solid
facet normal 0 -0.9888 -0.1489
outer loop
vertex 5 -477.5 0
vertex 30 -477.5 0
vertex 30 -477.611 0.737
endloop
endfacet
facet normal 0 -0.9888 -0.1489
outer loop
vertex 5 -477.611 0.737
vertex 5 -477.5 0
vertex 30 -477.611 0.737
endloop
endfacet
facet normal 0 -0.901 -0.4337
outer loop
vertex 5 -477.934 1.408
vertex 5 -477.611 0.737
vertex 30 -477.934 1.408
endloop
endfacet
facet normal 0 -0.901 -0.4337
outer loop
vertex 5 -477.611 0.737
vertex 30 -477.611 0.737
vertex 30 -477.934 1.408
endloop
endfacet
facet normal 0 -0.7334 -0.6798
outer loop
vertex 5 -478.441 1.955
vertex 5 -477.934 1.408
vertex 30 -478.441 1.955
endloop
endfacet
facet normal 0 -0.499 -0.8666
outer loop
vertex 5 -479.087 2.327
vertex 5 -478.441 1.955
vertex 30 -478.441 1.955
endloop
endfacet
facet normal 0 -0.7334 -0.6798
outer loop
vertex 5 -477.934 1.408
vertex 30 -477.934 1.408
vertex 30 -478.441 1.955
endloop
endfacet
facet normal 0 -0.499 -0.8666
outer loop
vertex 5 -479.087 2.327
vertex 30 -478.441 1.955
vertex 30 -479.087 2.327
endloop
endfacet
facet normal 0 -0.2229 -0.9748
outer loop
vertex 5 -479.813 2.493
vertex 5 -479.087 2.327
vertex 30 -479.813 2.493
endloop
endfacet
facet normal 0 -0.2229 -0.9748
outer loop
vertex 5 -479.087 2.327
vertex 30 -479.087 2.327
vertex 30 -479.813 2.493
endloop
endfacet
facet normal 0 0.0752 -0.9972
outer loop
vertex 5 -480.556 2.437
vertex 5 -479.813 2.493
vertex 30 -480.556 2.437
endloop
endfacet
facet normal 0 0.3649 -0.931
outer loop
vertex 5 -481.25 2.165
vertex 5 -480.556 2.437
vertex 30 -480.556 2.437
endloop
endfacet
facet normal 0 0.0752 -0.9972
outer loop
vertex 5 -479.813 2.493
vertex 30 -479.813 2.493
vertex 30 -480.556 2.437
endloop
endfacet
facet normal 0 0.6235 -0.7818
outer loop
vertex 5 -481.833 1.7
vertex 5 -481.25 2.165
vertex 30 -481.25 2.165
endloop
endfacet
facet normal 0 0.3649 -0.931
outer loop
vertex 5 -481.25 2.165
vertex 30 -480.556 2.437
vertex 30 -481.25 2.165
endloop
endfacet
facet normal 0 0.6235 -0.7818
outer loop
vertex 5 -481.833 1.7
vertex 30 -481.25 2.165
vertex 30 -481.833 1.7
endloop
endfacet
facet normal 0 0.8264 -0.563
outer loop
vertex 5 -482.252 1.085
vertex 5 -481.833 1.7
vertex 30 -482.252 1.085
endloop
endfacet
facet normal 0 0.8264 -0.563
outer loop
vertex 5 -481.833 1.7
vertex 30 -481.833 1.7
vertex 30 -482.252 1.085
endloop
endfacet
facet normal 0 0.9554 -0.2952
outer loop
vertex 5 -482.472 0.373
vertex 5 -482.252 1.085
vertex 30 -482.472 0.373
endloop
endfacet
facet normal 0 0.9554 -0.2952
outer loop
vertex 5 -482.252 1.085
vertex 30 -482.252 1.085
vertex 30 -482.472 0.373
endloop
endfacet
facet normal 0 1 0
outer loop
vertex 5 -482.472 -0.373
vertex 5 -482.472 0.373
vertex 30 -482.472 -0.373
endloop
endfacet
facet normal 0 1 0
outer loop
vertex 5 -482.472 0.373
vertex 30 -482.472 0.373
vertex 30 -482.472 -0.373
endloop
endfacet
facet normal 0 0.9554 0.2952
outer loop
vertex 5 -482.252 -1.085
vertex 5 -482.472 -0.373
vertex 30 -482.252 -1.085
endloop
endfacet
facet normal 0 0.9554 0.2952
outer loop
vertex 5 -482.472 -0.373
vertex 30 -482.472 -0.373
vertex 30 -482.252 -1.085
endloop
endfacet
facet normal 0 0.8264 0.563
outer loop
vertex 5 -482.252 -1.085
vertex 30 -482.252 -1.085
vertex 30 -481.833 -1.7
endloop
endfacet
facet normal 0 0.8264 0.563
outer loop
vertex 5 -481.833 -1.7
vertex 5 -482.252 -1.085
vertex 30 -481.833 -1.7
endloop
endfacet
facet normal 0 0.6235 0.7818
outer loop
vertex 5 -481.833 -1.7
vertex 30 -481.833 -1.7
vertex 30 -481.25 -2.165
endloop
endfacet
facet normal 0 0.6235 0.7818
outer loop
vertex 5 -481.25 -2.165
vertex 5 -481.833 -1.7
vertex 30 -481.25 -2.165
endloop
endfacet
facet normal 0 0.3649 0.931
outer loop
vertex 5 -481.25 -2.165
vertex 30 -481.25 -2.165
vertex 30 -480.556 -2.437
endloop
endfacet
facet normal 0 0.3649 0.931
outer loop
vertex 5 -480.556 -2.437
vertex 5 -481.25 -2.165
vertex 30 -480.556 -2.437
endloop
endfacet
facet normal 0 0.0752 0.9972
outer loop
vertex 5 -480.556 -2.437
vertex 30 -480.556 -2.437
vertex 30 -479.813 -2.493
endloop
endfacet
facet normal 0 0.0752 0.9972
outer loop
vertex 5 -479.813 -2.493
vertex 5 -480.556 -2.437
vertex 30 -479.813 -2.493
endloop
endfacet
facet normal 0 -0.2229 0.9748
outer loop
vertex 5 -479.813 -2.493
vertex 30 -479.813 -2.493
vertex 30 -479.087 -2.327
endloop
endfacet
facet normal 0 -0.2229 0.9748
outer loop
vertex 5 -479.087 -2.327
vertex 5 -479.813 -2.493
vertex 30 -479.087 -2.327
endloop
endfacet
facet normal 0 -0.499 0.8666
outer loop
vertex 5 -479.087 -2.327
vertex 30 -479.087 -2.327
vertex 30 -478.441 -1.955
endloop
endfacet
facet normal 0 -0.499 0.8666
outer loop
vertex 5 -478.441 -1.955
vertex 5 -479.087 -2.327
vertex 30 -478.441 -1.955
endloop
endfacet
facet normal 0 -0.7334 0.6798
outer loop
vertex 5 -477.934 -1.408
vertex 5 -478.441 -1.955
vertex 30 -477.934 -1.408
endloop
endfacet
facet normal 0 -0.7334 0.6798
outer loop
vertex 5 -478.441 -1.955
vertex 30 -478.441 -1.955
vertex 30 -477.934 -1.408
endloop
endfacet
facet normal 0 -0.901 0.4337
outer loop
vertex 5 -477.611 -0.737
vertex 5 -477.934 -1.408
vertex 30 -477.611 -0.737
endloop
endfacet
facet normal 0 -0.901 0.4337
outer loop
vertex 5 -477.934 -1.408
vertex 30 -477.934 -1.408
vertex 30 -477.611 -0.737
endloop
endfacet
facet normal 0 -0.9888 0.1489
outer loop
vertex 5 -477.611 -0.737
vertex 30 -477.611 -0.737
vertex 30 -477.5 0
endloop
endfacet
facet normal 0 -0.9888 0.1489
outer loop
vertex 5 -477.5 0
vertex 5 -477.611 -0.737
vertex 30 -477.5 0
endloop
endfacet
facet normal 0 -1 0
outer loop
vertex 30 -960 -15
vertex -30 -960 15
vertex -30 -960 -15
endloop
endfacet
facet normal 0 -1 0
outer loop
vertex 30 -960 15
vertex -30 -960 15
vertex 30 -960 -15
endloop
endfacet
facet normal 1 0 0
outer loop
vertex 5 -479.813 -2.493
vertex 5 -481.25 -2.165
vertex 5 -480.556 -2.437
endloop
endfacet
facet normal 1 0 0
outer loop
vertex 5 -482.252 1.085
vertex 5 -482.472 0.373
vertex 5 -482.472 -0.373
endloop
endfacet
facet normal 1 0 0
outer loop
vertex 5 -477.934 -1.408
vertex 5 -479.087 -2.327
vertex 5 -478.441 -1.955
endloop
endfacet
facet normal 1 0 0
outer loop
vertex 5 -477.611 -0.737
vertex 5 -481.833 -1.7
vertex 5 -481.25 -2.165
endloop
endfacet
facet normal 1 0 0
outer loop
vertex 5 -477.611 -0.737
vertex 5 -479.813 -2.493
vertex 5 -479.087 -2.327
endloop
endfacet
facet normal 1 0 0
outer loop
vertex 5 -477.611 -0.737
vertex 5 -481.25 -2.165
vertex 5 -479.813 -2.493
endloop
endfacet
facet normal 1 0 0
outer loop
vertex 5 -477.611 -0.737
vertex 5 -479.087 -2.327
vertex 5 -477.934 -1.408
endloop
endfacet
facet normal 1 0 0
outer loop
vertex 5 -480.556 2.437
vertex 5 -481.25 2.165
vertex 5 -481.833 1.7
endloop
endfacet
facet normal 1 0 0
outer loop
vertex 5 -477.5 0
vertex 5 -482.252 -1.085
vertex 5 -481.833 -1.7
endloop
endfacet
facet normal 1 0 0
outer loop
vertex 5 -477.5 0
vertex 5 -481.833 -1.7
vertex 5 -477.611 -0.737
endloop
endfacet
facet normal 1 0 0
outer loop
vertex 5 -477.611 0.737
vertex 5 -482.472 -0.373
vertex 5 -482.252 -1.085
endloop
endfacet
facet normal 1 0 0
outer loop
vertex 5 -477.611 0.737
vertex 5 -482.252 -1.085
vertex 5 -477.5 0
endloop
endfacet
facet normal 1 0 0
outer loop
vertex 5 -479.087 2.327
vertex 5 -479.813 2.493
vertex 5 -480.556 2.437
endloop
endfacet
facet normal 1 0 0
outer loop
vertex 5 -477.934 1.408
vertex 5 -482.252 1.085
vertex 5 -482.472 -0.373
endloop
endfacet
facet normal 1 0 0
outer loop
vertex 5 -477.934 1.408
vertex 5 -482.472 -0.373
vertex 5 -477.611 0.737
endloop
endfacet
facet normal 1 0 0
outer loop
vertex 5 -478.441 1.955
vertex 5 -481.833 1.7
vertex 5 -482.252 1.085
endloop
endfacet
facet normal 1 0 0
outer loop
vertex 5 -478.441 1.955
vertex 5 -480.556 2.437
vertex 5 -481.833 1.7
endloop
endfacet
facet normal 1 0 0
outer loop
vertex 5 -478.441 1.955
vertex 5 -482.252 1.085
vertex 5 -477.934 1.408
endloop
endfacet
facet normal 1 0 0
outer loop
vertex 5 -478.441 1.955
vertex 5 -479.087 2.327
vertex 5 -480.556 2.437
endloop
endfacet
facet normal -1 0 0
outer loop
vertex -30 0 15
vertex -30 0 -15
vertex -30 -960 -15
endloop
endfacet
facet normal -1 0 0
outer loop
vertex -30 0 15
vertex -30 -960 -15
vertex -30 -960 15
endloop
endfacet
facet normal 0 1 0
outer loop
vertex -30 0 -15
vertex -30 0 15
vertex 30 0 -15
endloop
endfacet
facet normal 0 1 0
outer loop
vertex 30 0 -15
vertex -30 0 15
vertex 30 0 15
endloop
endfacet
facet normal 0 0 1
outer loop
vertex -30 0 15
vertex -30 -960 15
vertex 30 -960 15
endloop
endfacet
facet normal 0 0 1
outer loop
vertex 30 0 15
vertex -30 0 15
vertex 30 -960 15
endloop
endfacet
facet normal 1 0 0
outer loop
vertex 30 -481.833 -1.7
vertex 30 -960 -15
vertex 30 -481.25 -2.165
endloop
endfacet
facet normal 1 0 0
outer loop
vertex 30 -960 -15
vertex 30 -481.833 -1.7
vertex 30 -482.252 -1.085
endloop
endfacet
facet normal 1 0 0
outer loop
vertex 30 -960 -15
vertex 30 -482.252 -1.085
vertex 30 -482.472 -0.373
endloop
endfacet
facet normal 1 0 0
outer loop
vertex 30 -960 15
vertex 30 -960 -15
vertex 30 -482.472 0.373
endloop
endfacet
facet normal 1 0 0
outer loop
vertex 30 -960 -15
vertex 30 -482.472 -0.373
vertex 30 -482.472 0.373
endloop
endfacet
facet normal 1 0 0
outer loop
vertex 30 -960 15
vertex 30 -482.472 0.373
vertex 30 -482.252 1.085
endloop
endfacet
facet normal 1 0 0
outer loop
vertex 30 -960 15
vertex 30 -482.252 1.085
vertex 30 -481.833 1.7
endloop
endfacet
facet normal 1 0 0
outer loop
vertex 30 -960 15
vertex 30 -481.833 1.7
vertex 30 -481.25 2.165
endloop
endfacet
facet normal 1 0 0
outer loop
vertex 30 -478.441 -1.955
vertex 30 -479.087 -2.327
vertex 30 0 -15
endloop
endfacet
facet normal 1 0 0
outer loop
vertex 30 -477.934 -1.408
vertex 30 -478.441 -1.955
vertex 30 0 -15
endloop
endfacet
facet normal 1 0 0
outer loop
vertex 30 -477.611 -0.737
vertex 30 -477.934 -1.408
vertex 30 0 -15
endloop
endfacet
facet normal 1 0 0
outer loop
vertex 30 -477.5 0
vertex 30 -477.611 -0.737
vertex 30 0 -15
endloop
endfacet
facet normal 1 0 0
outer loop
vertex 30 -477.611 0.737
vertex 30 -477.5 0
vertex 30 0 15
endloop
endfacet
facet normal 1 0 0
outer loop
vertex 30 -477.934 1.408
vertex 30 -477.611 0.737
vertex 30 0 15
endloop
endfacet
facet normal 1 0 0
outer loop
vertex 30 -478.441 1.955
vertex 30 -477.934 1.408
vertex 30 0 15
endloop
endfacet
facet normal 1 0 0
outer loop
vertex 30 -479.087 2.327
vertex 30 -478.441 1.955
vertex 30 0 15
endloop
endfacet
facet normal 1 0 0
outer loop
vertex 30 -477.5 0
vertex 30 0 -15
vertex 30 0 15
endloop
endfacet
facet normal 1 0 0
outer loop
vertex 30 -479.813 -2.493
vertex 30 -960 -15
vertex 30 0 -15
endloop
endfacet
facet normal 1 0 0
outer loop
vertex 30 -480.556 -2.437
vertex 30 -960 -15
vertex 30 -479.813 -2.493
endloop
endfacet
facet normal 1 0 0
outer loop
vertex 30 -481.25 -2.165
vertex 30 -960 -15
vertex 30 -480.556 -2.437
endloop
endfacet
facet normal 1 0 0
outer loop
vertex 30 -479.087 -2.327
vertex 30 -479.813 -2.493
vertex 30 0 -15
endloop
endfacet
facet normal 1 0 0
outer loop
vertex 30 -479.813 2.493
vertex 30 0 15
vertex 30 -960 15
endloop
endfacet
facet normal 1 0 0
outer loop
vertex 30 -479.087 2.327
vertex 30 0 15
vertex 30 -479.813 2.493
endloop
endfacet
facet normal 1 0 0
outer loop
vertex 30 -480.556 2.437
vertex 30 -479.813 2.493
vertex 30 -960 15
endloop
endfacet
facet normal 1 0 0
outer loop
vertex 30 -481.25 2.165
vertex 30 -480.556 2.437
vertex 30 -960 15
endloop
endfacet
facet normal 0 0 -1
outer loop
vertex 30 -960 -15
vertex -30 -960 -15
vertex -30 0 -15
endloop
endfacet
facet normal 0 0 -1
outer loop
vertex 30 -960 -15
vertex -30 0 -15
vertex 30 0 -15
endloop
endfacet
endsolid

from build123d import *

# Parameters (mm, degrees)
F0_W     = 60
F0_H     = 30
F1_DEPTH = 960
F2_R     = 2.5
F3_DEPTH = 25


with BuildPart() as f1:
    # F0 (on Front) → F1 (new body)
    with BuildSketch(Plane.XZ):
        Rectangle(F0_W, F0_H)
    extrude(amount=F1_DEPTH)

    # F2 (on face) → F3 (cut)
    with BuildSketch(Plane.YZ.offset(30)):
        with Locations((-480, 0)):
            Circle(F2_R)
    extrude(amount=-F3_DEPTH, mode=Mode.SUBTRACT)


solid = f1.part
